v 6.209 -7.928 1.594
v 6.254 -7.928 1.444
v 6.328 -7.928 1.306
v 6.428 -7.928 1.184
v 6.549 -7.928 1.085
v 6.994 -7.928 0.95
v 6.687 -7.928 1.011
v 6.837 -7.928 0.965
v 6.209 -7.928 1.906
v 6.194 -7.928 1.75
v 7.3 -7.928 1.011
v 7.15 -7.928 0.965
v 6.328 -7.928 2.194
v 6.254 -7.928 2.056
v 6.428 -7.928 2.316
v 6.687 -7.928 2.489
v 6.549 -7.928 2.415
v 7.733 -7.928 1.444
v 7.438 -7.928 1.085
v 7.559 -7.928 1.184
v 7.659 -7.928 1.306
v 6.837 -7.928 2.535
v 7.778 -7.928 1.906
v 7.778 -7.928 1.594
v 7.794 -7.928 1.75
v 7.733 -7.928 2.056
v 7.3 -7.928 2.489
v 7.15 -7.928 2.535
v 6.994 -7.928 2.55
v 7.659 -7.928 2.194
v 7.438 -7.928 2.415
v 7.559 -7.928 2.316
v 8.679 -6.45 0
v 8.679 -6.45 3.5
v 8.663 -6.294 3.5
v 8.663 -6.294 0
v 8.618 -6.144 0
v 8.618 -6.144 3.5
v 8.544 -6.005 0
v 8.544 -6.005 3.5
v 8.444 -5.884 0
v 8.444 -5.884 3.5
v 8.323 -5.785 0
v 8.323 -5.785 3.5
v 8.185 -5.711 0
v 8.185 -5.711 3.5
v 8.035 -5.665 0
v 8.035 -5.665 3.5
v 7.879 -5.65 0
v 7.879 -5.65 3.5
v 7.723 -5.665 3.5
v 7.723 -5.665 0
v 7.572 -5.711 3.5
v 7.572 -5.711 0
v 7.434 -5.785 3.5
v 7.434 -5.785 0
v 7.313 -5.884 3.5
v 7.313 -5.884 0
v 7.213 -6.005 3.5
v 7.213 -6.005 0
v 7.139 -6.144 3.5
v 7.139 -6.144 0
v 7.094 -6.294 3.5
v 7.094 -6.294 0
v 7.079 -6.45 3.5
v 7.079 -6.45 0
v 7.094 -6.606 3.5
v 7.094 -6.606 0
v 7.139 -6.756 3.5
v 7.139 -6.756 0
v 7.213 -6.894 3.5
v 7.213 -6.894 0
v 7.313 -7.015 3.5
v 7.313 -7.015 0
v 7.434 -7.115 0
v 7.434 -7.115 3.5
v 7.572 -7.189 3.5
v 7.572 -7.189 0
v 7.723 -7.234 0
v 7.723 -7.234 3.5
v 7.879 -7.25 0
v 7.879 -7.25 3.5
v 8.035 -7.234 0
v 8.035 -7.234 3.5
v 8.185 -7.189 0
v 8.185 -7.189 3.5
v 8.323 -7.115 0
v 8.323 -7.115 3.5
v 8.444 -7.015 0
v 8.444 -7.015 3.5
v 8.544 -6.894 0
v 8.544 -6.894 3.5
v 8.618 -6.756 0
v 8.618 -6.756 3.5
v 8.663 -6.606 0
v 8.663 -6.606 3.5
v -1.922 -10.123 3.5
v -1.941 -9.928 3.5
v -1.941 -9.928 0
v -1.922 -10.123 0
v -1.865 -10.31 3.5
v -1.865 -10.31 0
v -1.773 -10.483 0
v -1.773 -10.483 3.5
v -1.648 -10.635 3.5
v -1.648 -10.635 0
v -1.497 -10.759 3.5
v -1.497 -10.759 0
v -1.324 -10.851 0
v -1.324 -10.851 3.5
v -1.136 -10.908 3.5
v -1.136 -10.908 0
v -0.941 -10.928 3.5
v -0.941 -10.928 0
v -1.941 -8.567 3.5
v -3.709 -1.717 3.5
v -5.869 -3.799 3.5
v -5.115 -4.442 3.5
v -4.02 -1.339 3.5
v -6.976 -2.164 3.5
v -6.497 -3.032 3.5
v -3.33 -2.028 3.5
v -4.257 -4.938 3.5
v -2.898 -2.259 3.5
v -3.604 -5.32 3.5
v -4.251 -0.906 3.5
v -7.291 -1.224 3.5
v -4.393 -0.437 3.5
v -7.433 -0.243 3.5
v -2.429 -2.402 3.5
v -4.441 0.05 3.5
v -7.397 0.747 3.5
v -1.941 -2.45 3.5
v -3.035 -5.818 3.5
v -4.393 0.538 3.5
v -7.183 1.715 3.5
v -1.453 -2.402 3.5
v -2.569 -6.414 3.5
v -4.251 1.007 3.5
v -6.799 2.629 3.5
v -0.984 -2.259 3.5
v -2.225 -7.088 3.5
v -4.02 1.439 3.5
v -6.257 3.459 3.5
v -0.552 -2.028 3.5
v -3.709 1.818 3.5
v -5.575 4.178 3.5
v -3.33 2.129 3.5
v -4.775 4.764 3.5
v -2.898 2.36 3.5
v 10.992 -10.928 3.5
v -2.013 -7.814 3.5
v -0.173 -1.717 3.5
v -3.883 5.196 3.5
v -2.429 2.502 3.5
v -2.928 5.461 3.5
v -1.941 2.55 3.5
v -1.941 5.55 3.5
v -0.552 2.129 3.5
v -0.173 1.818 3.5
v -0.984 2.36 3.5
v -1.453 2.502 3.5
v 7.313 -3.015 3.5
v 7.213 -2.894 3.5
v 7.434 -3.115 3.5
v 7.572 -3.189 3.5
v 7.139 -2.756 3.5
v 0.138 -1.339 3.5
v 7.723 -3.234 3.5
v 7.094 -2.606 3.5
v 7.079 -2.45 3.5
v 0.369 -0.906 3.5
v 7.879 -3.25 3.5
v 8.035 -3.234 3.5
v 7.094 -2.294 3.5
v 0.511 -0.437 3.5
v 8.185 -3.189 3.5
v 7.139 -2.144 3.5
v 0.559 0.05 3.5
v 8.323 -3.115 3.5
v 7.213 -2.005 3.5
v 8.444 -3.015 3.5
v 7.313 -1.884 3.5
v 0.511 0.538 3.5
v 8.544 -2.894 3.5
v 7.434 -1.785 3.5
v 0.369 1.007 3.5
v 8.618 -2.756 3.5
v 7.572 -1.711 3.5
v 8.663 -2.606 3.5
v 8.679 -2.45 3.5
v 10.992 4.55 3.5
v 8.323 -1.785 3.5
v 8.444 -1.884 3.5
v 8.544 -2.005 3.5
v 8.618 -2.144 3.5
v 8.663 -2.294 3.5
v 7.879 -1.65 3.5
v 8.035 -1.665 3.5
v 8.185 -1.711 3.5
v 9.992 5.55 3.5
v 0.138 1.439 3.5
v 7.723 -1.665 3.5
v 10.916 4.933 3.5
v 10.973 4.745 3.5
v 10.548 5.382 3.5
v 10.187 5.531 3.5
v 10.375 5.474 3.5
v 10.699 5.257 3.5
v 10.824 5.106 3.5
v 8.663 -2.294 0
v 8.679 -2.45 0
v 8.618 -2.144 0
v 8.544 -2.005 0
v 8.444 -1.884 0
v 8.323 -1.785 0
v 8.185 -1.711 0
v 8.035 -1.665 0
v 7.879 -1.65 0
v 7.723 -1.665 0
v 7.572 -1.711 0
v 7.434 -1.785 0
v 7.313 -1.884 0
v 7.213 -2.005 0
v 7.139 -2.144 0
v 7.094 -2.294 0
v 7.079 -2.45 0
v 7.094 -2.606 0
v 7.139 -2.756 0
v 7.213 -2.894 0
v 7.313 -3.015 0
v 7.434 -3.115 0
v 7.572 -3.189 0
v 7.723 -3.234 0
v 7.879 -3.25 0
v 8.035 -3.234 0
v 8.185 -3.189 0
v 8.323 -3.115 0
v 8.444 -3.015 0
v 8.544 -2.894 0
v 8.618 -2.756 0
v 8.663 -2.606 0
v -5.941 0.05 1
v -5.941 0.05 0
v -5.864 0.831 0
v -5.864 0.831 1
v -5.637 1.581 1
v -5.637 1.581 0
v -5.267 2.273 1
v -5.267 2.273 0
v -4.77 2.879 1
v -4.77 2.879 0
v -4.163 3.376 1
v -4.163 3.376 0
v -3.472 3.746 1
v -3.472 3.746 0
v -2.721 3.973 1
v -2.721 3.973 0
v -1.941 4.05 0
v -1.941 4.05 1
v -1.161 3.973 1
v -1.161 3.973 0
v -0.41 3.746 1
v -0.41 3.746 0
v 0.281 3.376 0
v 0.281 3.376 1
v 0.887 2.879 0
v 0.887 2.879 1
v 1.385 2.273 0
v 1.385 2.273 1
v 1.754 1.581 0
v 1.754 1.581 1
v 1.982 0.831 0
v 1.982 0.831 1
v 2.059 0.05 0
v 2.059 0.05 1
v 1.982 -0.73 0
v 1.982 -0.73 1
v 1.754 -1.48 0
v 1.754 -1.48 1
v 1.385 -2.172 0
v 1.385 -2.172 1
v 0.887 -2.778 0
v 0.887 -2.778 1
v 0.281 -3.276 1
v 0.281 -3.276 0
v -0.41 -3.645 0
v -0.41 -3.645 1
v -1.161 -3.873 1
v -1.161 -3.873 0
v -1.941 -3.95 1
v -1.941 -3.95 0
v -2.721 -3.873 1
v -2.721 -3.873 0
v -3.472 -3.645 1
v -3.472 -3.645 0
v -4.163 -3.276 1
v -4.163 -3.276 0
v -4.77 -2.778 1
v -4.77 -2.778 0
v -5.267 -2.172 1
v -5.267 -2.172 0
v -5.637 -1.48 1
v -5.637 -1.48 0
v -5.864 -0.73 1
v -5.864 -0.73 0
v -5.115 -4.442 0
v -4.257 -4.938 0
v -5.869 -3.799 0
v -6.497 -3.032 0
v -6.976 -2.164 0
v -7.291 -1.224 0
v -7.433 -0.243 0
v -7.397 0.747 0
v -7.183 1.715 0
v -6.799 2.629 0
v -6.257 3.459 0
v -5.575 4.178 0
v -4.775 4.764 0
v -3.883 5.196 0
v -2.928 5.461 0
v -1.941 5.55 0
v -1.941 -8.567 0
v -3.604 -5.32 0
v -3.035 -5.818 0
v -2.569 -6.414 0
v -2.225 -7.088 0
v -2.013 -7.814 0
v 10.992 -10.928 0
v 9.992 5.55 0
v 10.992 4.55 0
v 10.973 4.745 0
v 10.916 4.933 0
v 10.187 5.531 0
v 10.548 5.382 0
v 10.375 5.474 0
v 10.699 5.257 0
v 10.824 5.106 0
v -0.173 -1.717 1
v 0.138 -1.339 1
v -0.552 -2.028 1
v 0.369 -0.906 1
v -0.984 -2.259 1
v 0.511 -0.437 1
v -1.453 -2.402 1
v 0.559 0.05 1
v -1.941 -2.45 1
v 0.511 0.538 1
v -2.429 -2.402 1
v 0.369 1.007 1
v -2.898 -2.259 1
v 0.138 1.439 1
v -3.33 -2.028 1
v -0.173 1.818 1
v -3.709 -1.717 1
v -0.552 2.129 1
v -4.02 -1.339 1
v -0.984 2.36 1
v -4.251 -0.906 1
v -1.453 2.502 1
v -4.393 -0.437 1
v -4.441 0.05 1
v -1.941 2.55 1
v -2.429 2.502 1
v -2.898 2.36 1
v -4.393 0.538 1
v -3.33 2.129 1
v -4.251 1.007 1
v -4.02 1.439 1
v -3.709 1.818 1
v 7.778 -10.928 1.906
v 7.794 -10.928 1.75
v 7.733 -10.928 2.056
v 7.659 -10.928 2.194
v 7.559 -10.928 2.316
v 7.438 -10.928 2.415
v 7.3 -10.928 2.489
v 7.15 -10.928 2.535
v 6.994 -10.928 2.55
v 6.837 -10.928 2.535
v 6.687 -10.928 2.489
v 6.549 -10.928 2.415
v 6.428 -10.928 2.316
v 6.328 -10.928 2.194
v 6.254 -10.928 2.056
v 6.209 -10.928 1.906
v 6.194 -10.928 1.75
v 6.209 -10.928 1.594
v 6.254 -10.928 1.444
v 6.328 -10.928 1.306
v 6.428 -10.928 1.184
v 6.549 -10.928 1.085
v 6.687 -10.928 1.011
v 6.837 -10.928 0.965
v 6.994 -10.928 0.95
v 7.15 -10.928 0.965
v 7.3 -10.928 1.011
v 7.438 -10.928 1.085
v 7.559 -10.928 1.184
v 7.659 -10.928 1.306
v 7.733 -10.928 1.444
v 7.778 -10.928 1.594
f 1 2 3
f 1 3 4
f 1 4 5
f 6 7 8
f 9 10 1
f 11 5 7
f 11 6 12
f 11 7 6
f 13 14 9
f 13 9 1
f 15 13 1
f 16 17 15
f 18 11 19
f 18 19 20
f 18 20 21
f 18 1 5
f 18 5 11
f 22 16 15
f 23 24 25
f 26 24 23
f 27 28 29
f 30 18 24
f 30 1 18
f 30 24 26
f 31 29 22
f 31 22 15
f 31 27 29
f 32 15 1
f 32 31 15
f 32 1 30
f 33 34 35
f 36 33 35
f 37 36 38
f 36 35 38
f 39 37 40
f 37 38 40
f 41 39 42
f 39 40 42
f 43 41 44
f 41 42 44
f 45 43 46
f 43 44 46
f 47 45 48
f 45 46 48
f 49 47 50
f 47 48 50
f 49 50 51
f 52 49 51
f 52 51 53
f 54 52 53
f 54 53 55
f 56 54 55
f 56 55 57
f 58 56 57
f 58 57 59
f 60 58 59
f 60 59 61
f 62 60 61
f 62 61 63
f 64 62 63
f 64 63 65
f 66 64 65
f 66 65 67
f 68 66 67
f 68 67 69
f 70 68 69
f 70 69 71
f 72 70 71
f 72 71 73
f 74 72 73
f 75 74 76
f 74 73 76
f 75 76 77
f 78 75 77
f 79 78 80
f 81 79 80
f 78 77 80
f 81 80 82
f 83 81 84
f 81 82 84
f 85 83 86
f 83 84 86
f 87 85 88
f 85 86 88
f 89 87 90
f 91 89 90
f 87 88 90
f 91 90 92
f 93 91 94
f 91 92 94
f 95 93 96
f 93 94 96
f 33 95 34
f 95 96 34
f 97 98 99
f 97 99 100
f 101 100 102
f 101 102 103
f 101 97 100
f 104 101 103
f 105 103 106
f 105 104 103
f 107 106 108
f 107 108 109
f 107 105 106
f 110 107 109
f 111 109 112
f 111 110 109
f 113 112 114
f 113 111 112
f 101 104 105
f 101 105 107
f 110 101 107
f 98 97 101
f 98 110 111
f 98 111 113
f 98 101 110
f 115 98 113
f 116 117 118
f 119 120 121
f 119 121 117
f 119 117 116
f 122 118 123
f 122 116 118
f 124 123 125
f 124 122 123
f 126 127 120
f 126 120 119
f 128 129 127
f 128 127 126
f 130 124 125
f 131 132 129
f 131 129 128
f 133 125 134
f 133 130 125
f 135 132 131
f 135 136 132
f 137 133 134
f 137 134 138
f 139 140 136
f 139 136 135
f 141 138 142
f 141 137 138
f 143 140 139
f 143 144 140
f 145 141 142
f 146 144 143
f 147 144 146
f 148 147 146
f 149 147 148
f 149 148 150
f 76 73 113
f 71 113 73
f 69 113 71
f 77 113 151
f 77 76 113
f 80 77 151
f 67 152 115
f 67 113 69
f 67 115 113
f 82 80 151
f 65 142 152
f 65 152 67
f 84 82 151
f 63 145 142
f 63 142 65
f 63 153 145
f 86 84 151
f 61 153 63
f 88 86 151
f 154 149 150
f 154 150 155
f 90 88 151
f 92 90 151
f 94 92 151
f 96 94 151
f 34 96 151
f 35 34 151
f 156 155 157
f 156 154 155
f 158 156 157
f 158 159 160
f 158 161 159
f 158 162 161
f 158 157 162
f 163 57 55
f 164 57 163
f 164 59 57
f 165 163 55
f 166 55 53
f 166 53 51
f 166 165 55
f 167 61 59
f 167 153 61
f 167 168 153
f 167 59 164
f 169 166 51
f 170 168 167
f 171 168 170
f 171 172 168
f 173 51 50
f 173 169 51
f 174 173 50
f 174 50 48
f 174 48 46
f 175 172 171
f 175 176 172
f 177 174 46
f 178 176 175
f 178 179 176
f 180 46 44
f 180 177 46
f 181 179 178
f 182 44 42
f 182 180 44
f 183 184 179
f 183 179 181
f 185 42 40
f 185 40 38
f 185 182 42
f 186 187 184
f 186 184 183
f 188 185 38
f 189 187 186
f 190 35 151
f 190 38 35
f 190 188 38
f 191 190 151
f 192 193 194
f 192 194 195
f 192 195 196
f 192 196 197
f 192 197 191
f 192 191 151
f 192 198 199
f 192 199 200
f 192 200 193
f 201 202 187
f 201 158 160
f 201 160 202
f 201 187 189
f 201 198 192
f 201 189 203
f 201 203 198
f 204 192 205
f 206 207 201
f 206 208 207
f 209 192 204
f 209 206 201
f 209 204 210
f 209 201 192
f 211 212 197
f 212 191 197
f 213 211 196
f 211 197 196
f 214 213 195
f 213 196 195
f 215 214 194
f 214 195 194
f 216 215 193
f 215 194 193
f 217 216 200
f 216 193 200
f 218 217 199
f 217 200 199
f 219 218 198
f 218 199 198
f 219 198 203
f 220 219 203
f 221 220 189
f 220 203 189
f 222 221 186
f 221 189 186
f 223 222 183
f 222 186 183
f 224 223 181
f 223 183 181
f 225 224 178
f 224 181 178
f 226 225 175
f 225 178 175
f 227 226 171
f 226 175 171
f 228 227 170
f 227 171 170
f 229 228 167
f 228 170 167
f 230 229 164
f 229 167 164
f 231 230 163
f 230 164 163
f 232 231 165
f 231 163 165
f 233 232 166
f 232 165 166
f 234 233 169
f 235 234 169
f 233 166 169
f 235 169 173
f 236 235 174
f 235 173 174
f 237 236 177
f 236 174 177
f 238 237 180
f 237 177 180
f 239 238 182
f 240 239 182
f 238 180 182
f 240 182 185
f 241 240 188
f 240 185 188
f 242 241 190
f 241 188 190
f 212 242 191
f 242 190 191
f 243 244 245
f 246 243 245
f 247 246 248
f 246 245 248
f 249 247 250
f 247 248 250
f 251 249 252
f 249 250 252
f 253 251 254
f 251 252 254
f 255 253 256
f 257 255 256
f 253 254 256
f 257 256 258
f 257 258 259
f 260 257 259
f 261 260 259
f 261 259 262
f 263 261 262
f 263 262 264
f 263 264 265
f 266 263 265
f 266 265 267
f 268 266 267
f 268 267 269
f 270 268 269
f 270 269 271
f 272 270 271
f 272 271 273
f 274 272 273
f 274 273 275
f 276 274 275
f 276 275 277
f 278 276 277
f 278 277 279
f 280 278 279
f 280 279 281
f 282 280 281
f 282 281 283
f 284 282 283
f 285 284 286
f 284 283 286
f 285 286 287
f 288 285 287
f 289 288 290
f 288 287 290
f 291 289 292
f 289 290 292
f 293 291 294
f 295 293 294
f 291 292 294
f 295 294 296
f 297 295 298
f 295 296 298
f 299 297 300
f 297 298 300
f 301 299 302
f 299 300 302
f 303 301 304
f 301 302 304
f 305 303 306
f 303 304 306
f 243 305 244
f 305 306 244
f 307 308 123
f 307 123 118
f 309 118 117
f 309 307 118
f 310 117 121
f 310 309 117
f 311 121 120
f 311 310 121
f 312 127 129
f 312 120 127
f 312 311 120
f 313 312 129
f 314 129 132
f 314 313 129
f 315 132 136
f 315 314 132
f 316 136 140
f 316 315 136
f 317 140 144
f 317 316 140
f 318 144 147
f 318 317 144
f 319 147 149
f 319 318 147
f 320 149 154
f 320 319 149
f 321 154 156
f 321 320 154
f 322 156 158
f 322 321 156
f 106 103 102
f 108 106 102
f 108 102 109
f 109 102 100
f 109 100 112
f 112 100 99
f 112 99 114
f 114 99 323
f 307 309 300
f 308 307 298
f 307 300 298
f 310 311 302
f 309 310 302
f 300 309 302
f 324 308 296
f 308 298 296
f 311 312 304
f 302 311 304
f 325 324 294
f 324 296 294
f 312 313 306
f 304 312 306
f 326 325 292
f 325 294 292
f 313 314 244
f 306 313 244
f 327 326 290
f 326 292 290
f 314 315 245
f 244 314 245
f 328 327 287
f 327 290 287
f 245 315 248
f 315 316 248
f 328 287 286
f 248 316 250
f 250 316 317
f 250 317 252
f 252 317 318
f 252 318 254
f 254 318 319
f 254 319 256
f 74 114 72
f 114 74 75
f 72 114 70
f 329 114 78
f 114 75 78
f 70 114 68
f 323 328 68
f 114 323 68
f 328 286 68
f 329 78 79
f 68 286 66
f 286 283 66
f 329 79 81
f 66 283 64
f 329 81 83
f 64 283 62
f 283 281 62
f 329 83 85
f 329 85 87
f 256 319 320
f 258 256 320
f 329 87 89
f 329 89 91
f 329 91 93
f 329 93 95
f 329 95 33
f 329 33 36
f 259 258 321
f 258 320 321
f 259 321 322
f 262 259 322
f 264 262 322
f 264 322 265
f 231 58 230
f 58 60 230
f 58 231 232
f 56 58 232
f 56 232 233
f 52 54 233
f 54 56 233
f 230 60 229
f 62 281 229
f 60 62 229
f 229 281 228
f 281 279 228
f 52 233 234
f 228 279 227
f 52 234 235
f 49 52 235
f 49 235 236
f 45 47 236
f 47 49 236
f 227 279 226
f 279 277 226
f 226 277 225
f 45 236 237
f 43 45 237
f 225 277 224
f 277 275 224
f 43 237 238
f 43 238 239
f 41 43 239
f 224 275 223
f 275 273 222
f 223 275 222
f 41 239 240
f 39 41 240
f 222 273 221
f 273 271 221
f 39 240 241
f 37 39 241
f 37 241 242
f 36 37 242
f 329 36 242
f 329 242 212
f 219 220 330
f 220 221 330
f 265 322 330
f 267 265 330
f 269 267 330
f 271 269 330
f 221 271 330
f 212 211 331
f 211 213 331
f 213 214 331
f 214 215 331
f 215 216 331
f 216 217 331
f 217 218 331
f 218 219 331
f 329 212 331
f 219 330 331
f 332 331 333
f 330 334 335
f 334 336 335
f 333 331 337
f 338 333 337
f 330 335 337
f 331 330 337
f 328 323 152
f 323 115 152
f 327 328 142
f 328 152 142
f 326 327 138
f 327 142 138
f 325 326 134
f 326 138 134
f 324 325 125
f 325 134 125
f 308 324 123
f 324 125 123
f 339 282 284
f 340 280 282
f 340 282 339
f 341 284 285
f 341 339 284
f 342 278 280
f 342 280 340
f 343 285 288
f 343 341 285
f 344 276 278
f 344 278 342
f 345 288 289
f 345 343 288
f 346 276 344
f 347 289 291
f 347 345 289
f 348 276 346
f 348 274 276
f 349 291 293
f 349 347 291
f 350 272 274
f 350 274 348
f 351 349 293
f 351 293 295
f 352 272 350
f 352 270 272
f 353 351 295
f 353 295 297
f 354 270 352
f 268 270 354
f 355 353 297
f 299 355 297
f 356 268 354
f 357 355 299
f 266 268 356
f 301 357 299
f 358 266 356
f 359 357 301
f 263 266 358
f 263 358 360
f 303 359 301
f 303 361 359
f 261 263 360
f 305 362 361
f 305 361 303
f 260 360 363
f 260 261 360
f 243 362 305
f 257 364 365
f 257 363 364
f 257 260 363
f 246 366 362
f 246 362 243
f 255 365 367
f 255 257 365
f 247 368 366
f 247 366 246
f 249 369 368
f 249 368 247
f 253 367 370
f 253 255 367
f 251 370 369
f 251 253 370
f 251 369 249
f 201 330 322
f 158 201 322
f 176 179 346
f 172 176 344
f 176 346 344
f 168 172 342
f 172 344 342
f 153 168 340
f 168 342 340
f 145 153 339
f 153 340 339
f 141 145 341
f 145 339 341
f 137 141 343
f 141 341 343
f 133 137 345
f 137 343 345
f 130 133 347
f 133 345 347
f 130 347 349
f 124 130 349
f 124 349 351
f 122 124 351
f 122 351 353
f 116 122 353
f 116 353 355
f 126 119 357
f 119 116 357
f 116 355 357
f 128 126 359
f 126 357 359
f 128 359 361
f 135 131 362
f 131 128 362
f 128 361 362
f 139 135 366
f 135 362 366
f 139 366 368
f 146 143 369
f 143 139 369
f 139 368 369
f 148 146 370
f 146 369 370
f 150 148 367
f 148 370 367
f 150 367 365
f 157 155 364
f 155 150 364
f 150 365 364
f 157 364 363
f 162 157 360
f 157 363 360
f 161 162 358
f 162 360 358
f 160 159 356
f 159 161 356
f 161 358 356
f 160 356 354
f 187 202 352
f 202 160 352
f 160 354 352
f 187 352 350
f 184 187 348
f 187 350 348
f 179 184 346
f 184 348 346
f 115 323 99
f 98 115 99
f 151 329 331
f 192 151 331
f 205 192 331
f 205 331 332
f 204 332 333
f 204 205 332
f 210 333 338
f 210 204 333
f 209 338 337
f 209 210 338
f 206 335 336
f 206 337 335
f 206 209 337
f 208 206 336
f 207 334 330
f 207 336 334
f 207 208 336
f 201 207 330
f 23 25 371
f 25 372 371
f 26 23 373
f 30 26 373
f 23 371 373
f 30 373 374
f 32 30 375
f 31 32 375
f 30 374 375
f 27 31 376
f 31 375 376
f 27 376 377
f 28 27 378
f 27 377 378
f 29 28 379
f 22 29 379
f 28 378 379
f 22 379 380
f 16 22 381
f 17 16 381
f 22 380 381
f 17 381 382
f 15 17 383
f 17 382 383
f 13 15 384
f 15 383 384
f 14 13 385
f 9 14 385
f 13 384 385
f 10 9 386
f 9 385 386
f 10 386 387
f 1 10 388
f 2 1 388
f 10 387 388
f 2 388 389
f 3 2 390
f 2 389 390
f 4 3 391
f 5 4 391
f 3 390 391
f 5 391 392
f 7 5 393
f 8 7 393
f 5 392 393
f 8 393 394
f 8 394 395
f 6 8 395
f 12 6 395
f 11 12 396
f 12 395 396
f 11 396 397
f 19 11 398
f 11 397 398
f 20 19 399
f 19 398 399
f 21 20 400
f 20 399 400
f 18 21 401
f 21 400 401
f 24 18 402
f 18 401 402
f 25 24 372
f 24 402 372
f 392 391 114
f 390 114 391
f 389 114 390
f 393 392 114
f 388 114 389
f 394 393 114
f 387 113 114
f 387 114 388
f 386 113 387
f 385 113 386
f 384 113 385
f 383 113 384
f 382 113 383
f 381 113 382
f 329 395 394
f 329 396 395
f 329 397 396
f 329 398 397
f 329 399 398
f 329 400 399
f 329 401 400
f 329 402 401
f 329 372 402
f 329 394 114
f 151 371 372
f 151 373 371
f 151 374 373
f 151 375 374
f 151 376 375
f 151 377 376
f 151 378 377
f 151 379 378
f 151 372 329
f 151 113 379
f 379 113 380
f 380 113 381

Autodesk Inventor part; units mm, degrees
ref_plane "YZ Plane" through (0, 0, 0) normal (1, 0, 0) x (0, 1, 0)
ref_plane "XZ Plane" through (0, 0, 0) normal (0, 1, 0) x (-1, 0, 0)
ref_plane "XY Plane" through (0, 0, 0) normal (0, 0, 1) x (1, 0, 0)
sketch "草图1" plane through (0, 0, 0) normal (0, 0, 1) x (1, 0, 0)
  circle A0 centre (-1.9411, 0.0503) radius 2.5
  line L0 (4.3454, -10.9196) -> (9.6453, -10.9355) projected
  circle A1 centre (-1.9411, 0.0503) radius 5.5
  line L1 (-1.9411, -10.9276) -> (10.9921, -10.9276)
  line L2 (10.9921, -10.9276) -> (10.9921, 5.5503)
  line L3 (10.9921, 5.5503) -> (-1.9411, 5.5503)
  line L4 (-1.9411, 5.5503) -> (-1.9411, -10.9276)
  point P0 (6.9953, -10.9276)
  point P1 (-1.9411, 5.5503)
  point P2 (-1.9411, -5.4497)
  dimension "d3" = 3
  dimension "d5" = 5
extrude "拉伸1" add sketch "草图1" along normal blind 3.5 contours A0 L4 A1 | A0 L4 A1 | L3 L2 L1 L4 A1
fillet "圆角1" radius 4 1 edges at (-1.9411, -5.4497, 1.75)
sketch "草图2" plane through (0, 0, 0) normal (0, 0, -1) x (-1, 0, 0)
  point P0 (0, 0)
sketch "草图3" plane through (0, 0, 0) normal (0, 0, -1) x (-1, 0, 0)
  circle A0 centre (1.9411, 0.0503) radius 2.5 projected
  circle A1 centre (1.9411, 0.0503) radius 4
  point P0 (0, 0)
  dimension "d6" = 8
extrude "拉伸2" cut sketch "草图3" against normal blind 1 contours A0 | A1
sketch "草图4" plane through (-1.9411, -10.9276, 0) normal (0, -1, 0) x (1, 0, 0)
  ellipse E0 centre (8.9346, 1.75) end of major axis (8.9346, 0.85) minor radius 0.9 projected
  point P0 (1.9411, 0)
extrude "拉伸3" cut sketch "草图4" against normal blind 3
fillet "圆角2" radius 1 2 edges at (10.9921, 5.5503, 1.75) (-1.9411, -10.9276, 1.75)
sketch "草图5" plane through (0, 0, 3.5) normal (0, 0, 1) x (1, 0, 0)
  line L0 (15.1126, -4.4497) -> (15.1126, -8.4497) projected
  line L1 (5.3617, -4.4497) -> (15.1126, -4.4497) projected
  line L2 (5.3617, -8.4497) -> (5.3617, -4.4497) projected
  line L3 (5.3617, -8.4497) -> (15.1126, -8.4497) projected
  line L4 (5.3617, -6.4497) -> (10.3955, -6.4497)
  circle A0 centre (7.8786, -6.4497) radius 0.8
  circle A1 centre (7.8786, -6.4497) radius 1 projected
  point P0 (0, 0)
  dimension "d12" = 1.6
extrude "拉伸4" cut sketch "草图5" against normal blind 5.5 contours A0 L4 | L4 A0
sketch "草图6" plane through (0, 0, 3.5) normal (0, 0, 1) x (1, 0, 0)
  circle A0 centre (7.8786, -2.4497) radius 0.8
  circle A1 centre (7.8786, -6.4497) radius 0.8 projected
  line L0 (7.8786, -6.4497) -> (7.8786, 5.5503)
  line L1 (9.9921, 5.5503) -> (-1.9411, 5.5503) projected
  point P0 (0, 0)
  dimension "d17" = 1.6
extrude "拉伸5" cut sketch "草图6" against normal blind 10 contours A0 L0 | L0 A0
sketch "草图7" plane through (10.9921, -10.9276, 0) normal (0, -1, 0) x (1, 0, 0)
  ellipse E0 centre (-3.9986, 1.75) end of major axis (-3.9986, 0.85) minor radius 0.9 projected
  circle A0 centre (-3.9986, 1.75) radius 0.8
  point P0 (-10.9921, 0)
  dimension "d18" = 1.6
extrude "拉伸6" add sketch "草图7" against normal up to surface (3 mm away)
properties part number "针头装配体"
